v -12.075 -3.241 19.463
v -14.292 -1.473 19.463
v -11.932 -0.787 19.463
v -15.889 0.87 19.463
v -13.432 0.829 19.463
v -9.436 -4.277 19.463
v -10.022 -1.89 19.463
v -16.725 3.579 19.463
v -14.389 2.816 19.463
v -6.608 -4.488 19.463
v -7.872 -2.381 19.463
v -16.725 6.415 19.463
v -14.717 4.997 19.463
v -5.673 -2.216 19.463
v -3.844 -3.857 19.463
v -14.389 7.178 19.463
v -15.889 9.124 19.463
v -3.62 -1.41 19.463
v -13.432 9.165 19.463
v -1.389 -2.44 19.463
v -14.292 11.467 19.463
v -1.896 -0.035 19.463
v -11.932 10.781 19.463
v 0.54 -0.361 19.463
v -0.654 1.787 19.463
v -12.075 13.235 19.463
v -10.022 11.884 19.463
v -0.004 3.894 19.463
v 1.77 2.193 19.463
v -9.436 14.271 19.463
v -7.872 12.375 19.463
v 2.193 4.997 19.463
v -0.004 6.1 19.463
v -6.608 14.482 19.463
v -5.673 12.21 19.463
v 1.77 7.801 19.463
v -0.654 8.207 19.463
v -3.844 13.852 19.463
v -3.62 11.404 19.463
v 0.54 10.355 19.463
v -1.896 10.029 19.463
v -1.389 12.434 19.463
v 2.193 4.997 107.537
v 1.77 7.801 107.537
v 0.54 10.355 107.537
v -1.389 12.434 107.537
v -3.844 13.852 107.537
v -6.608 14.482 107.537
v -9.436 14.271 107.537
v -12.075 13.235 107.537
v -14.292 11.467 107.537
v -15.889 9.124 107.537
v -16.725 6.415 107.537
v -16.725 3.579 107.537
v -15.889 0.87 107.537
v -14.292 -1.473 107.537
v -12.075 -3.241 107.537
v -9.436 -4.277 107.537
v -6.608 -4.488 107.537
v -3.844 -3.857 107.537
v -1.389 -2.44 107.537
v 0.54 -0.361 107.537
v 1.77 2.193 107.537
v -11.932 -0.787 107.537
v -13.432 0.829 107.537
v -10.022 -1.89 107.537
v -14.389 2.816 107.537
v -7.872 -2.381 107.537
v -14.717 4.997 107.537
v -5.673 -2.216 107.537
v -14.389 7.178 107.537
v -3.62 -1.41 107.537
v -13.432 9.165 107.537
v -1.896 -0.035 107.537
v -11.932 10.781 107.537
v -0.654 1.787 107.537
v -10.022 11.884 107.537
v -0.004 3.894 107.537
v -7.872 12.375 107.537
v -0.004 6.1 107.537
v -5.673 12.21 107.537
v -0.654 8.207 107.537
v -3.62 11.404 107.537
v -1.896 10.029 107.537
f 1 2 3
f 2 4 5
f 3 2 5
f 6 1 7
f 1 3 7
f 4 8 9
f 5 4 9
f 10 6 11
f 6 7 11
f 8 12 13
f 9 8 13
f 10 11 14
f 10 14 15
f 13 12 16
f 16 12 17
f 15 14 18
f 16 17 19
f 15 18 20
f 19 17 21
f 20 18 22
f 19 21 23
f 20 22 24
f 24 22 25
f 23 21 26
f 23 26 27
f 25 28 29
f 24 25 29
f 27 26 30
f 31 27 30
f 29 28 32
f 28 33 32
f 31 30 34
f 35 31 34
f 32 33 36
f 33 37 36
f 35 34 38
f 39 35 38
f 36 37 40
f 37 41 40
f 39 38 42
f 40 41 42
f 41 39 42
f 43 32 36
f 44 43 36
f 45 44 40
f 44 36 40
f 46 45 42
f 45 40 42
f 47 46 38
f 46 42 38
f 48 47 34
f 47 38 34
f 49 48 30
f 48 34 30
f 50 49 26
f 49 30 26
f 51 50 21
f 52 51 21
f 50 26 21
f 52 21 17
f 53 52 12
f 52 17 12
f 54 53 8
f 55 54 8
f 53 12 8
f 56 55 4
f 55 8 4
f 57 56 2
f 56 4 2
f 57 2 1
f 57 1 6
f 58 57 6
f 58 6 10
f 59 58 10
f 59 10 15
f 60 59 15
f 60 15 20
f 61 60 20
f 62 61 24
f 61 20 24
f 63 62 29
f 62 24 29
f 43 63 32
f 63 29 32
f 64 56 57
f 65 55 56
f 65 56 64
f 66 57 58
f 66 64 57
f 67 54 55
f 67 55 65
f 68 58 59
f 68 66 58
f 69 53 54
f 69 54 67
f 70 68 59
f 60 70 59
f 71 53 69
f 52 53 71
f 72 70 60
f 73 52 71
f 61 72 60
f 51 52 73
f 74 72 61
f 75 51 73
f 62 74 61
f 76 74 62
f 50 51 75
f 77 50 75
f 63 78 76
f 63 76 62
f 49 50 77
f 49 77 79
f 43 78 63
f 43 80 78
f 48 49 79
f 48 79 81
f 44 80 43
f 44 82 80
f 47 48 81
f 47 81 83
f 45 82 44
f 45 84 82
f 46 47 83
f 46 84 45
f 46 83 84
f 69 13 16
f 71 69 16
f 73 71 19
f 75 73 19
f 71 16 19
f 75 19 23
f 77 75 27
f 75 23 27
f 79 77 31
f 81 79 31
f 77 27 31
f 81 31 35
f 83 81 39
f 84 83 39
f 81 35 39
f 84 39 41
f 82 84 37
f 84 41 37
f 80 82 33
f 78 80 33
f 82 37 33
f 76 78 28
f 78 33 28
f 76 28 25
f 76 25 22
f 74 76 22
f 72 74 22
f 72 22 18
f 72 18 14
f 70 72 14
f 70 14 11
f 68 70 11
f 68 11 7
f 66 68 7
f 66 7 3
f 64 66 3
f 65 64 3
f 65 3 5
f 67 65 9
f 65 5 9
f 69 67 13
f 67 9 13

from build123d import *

# Parameters (mm, degrees)
SKETCH1_R           = 13.716
BOSS_EXTRUDE1_DEPTH = 127
SKETCH2_R           = 10.668
CUT_EXTRUDE1_DEPTH  = 127
SCALE1_SCALE        = 0.735294118
SCALE2_SCALE        = 0.892857143
SCALE3_SCALE        = 1.056338028


with BuildPart() as part:
    # Sketch1 → Boss-Extrude1 (new body)
    with BuildSketch(Plane.XY):
        with Locations((-7.319167791, 4.997022186)):
            Circle(SKETCH1_R)
    extrude(amount=BOSS_EXTRUDE1_DEPTH)

    # Sketch2 → Cut-Extrude1 (cut)
    with BuildSketch(Plane(origin=(0, 0, 0), x_dir=(-1, 0, 0), z_dir=(0, 0, -1))):
        with Locations((7.319167791, 4.997022186)):
            Circle(SKETCH2_R)
    extrude(amount=-CUT_EXTRUDE1_DEPTH, mode=Mode.SUBTRACT)


with BuildPart() as part_1:
    # Scale1: scaled about (-7.319167791, 4.997022186, 63.5)
    add(part.part.scale(SCALE1_SCALE).moved(Location((-1.937426768, 1.322741167, 16.808823529))))


with BuildPart() as part_2:
    # Scale2: scaled about (-7.319167791, 4.997022186, 63.5)
    add(part_1.part.scale(SCALE2_SCALE).moved(Location((-0.784196549, 0.535395234, 6.803571429))))


with BuildPart() as part_3:
    # Scale3: scaled about (-7.319167791, 4.997022186, 63.5)
    add(part_2.part.scale(SCALE3_SCALE).moved(Location((0.412347481, -0.281522377, -3.577464789))))


solid = part_3.part
